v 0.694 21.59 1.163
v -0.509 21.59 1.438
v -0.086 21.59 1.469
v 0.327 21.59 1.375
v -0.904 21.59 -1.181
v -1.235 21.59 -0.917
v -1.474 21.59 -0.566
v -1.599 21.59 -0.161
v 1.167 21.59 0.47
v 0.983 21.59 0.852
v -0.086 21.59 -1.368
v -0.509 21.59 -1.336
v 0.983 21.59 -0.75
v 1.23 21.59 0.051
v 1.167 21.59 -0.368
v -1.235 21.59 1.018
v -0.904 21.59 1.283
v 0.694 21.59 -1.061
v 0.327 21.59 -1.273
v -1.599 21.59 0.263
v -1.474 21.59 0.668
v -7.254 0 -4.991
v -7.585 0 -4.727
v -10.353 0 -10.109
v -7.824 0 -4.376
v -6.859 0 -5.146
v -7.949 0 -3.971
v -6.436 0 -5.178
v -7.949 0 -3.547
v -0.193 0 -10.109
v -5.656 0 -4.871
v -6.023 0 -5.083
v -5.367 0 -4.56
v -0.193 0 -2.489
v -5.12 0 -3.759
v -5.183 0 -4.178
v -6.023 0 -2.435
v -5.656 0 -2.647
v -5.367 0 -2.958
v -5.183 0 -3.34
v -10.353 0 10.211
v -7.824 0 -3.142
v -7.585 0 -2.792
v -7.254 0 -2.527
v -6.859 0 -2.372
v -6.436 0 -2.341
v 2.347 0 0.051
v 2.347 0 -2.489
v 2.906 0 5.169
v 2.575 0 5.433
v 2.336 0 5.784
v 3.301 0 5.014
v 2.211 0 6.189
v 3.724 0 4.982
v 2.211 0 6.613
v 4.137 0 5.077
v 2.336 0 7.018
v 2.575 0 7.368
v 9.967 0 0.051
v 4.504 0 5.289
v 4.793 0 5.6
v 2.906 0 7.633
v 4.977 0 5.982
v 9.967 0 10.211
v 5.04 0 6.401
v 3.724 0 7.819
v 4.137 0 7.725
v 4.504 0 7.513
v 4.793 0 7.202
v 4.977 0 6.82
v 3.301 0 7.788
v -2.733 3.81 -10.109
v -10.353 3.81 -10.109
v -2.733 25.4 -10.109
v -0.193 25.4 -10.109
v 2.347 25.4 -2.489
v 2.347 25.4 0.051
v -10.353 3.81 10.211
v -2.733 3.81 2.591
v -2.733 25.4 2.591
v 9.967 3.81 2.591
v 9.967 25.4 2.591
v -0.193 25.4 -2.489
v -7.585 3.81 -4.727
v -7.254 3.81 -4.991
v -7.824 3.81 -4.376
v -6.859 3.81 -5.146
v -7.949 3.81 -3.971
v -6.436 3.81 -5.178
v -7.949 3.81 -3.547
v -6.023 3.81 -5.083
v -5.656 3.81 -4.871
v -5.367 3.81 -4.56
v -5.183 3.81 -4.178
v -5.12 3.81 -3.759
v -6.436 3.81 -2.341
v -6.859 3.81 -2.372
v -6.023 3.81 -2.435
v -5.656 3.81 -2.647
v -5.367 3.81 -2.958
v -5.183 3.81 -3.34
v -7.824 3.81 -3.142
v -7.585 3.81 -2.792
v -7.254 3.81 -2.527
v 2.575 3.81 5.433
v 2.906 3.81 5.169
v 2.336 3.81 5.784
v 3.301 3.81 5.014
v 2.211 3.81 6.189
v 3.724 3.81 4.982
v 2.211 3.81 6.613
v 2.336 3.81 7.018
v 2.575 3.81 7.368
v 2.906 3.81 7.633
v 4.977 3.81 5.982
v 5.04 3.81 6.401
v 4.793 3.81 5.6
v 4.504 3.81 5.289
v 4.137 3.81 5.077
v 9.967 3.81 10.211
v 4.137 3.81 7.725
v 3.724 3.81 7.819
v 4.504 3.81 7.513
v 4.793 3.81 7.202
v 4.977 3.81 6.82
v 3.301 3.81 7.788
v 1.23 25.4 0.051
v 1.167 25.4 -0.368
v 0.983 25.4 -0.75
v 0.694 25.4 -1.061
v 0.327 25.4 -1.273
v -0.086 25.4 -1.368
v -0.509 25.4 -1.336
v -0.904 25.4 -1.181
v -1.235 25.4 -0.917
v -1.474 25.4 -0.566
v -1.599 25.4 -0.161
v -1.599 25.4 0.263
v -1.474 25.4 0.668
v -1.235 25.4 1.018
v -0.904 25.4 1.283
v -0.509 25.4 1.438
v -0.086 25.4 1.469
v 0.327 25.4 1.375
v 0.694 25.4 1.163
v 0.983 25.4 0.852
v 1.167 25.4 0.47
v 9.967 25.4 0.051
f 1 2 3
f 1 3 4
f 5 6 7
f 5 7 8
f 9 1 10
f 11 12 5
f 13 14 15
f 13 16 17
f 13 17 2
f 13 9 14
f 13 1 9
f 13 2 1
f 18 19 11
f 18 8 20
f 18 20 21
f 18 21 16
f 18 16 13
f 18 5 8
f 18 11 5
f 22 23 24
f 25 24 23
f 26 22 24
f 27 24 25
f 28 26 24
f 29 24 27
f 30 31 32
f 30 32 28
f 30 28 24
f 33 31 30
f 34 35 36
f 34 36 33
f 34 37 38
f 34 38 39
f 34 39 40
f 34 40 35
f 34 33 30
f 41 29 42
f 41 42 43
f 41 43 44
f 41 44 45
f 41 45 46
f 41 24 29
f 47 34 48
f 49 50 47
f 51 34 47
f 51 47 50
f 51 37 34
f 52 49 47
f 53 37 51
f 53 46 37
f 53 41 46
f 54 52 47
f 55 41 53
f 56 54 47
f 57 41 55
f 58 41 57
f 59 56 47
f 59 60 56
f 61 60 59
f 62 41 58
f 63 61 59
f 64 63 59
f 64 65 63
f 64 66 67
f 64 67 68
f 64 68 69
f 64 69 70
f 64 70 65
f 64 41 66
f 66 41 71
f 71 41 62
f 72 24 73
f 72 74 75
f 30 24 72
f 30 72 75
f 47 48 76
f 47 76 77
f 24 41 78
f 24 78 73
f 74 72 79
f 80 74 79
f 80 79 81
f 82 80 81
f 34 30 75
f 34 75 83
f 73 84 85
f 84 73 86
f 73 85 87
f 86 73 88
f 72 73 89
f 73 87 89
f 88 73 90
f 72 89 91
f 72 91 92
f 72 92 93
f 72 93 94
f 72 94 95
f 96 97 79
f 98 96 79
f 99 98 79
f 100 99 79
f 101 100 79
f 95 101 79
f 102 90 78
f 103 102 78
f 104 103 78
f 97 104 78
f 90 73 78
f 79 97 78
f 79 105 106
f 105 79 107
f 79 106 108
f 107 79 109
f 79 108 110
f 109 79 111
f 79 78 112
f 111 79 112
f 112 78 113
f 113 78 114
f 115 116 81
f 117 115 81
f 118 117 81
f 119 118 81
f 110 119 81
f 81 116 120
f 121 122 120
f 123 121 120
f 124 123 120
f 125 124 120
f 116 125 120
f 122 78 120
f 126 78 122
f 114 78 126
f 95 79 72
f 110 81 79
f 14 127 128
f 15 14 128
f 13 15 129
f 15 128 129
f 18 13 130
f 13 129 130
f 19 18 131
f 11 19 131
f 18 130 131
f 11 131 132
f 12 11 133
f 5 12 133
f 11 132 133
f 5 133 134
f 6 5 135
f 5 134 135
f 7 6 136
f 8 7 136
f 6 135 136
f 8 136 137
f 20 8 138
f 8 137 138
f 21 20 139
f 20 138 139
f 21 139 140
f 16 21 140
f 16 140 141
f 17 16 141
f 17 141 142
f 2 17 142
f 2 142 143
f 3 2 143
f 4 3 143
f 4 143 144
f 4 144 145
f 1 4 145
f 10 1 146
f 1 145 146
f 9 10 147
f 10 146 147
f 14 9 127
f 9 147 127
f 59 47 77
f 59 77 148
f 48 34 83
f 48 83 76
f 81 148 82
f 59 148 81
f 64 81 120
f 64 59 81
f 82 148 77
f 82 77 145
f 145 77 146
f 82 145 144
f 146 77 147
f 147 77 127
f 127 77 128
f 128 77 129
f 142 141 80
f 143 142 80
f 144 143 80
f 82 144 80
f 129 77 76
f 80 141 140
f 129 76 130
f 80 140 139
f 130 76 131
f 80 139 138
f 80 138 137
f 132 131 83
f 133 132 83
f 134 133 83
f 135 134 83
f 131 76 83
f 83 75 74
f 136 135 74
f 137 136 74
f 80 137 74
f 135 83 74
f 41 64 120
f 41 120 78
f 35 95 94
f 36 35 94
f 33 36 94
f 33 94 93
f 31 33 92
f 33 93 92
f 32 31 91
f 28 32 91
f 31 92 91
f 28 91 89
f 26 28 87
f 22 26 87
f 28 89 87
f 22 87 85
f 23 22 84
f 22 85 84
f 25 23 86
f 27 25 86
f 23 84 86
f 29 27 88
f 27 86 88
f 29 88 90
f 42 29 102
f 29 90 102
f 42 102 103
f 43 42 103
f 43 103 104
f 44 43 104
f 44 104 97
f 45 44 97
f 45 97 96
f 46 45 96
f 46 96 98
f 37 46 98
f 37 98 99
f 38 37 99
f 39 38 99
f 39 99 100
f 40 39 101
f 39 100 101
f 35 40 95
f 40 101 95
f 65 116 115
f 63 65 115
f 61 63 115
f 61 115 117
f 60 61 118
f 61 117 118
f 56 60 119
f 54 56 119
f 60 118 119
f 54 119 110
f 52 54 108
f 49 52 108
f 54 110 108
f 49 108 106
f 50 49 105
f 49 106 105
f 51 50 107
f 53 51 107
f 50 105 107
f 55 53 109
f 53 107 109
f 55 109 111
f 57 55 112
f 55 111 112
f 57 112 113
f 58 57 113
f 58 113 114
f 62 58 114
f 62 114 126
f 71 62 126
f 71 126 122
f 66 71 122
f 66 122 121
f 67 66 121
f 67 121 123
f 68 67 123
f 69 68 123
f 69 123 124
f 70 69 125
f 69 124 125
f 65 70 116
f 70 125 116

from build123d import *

# Parameters (mm, degrees)
BOSS_EXTRUDE4_DEPTH                      = 25.4
SKETCH5_R                                = 1.4224
CAGE_MOUNTING_HOLE_4_40_TAPPED_DEPTH     = 3.81
BOSS_EXTRUDE5_DEPTH                      = 3.81
SKETCH7_R                                = 1.4224
BASE_MOUNTING_HOLES_4_40_CLEARANCE_DEPTH = 3.81


with BuildPart() as part:
    # Sketch4 → Boss-Extrude4 (new body)
    with BuildSketch(Plane(origin=(0, 0, 0), x_dir=(1, 0, 0), z_dir=(0, 1, 0))):
        Polygon((-2.732505263, 2.4892), (-2.732505263, 10.1092), (-0.192505263, 10.1092), (-0.192505263, 2.4892), (2.347494737, 2.4892), (2.347494737, -0.0508), (9.967494737, -0.0508), (9.967494737, -2.5908), (2.347494737, -2.5908), (-2.732505263, -2.5908), align=None)
    extrude(amount=BOSS_EXTRUDE4_DEPTH)

    # Sketch5 → Cage Mounting Hole (4-40 Tapped) (cut)
    with BuildSketch(Plane(origin=(0, 25.4, 0), x_dir=(1, 0, 0), z_dir=(0, 1, 0))):
        with Locations((-0.192505263, -0.0508)):
            Circle(SKETCH5_R)
    extrude(amount=-CAGE_MOUNTING_HOLE_4_40_TAPPED_DEPTH, mode=Mode.SUBTRACT)

    # Sketch6 → Boss-Extrude5 (add)
    with BuildSketch(Plane.XZ):
        Polygon((9.967494737, 2.5908), (9.967494737, 10.2108), (-10.352505263, 10.2108), (-10.352505263, -10.1092), (-2.732505263, -10.1092), (-2.732505263, 2.5908), align=None)
    extrude(amount=-BOSS_EXTRUDE5_DEPTH)

    # Sketch7 → Base Mounting Holes (4-40 Clearance) (cut)
    with BuildSketch(Plane(origin=(0, 3.81, 0), x_dir=(1, 0, 0), z_dir=(0, 1, 0))):
        with Locations((-6.542505263, 3.7592)):
            Circle(SKETCH7_R)
        with Locations((3.617494737, -6.4008)):
            Circle(SKETCH7_R)
    extrude(amount=-BASE_MOUNTING_HOLES_4_40_CLEARANCE_DEPTH, mode=Mode.SUBTRACT)


solid = part.part
